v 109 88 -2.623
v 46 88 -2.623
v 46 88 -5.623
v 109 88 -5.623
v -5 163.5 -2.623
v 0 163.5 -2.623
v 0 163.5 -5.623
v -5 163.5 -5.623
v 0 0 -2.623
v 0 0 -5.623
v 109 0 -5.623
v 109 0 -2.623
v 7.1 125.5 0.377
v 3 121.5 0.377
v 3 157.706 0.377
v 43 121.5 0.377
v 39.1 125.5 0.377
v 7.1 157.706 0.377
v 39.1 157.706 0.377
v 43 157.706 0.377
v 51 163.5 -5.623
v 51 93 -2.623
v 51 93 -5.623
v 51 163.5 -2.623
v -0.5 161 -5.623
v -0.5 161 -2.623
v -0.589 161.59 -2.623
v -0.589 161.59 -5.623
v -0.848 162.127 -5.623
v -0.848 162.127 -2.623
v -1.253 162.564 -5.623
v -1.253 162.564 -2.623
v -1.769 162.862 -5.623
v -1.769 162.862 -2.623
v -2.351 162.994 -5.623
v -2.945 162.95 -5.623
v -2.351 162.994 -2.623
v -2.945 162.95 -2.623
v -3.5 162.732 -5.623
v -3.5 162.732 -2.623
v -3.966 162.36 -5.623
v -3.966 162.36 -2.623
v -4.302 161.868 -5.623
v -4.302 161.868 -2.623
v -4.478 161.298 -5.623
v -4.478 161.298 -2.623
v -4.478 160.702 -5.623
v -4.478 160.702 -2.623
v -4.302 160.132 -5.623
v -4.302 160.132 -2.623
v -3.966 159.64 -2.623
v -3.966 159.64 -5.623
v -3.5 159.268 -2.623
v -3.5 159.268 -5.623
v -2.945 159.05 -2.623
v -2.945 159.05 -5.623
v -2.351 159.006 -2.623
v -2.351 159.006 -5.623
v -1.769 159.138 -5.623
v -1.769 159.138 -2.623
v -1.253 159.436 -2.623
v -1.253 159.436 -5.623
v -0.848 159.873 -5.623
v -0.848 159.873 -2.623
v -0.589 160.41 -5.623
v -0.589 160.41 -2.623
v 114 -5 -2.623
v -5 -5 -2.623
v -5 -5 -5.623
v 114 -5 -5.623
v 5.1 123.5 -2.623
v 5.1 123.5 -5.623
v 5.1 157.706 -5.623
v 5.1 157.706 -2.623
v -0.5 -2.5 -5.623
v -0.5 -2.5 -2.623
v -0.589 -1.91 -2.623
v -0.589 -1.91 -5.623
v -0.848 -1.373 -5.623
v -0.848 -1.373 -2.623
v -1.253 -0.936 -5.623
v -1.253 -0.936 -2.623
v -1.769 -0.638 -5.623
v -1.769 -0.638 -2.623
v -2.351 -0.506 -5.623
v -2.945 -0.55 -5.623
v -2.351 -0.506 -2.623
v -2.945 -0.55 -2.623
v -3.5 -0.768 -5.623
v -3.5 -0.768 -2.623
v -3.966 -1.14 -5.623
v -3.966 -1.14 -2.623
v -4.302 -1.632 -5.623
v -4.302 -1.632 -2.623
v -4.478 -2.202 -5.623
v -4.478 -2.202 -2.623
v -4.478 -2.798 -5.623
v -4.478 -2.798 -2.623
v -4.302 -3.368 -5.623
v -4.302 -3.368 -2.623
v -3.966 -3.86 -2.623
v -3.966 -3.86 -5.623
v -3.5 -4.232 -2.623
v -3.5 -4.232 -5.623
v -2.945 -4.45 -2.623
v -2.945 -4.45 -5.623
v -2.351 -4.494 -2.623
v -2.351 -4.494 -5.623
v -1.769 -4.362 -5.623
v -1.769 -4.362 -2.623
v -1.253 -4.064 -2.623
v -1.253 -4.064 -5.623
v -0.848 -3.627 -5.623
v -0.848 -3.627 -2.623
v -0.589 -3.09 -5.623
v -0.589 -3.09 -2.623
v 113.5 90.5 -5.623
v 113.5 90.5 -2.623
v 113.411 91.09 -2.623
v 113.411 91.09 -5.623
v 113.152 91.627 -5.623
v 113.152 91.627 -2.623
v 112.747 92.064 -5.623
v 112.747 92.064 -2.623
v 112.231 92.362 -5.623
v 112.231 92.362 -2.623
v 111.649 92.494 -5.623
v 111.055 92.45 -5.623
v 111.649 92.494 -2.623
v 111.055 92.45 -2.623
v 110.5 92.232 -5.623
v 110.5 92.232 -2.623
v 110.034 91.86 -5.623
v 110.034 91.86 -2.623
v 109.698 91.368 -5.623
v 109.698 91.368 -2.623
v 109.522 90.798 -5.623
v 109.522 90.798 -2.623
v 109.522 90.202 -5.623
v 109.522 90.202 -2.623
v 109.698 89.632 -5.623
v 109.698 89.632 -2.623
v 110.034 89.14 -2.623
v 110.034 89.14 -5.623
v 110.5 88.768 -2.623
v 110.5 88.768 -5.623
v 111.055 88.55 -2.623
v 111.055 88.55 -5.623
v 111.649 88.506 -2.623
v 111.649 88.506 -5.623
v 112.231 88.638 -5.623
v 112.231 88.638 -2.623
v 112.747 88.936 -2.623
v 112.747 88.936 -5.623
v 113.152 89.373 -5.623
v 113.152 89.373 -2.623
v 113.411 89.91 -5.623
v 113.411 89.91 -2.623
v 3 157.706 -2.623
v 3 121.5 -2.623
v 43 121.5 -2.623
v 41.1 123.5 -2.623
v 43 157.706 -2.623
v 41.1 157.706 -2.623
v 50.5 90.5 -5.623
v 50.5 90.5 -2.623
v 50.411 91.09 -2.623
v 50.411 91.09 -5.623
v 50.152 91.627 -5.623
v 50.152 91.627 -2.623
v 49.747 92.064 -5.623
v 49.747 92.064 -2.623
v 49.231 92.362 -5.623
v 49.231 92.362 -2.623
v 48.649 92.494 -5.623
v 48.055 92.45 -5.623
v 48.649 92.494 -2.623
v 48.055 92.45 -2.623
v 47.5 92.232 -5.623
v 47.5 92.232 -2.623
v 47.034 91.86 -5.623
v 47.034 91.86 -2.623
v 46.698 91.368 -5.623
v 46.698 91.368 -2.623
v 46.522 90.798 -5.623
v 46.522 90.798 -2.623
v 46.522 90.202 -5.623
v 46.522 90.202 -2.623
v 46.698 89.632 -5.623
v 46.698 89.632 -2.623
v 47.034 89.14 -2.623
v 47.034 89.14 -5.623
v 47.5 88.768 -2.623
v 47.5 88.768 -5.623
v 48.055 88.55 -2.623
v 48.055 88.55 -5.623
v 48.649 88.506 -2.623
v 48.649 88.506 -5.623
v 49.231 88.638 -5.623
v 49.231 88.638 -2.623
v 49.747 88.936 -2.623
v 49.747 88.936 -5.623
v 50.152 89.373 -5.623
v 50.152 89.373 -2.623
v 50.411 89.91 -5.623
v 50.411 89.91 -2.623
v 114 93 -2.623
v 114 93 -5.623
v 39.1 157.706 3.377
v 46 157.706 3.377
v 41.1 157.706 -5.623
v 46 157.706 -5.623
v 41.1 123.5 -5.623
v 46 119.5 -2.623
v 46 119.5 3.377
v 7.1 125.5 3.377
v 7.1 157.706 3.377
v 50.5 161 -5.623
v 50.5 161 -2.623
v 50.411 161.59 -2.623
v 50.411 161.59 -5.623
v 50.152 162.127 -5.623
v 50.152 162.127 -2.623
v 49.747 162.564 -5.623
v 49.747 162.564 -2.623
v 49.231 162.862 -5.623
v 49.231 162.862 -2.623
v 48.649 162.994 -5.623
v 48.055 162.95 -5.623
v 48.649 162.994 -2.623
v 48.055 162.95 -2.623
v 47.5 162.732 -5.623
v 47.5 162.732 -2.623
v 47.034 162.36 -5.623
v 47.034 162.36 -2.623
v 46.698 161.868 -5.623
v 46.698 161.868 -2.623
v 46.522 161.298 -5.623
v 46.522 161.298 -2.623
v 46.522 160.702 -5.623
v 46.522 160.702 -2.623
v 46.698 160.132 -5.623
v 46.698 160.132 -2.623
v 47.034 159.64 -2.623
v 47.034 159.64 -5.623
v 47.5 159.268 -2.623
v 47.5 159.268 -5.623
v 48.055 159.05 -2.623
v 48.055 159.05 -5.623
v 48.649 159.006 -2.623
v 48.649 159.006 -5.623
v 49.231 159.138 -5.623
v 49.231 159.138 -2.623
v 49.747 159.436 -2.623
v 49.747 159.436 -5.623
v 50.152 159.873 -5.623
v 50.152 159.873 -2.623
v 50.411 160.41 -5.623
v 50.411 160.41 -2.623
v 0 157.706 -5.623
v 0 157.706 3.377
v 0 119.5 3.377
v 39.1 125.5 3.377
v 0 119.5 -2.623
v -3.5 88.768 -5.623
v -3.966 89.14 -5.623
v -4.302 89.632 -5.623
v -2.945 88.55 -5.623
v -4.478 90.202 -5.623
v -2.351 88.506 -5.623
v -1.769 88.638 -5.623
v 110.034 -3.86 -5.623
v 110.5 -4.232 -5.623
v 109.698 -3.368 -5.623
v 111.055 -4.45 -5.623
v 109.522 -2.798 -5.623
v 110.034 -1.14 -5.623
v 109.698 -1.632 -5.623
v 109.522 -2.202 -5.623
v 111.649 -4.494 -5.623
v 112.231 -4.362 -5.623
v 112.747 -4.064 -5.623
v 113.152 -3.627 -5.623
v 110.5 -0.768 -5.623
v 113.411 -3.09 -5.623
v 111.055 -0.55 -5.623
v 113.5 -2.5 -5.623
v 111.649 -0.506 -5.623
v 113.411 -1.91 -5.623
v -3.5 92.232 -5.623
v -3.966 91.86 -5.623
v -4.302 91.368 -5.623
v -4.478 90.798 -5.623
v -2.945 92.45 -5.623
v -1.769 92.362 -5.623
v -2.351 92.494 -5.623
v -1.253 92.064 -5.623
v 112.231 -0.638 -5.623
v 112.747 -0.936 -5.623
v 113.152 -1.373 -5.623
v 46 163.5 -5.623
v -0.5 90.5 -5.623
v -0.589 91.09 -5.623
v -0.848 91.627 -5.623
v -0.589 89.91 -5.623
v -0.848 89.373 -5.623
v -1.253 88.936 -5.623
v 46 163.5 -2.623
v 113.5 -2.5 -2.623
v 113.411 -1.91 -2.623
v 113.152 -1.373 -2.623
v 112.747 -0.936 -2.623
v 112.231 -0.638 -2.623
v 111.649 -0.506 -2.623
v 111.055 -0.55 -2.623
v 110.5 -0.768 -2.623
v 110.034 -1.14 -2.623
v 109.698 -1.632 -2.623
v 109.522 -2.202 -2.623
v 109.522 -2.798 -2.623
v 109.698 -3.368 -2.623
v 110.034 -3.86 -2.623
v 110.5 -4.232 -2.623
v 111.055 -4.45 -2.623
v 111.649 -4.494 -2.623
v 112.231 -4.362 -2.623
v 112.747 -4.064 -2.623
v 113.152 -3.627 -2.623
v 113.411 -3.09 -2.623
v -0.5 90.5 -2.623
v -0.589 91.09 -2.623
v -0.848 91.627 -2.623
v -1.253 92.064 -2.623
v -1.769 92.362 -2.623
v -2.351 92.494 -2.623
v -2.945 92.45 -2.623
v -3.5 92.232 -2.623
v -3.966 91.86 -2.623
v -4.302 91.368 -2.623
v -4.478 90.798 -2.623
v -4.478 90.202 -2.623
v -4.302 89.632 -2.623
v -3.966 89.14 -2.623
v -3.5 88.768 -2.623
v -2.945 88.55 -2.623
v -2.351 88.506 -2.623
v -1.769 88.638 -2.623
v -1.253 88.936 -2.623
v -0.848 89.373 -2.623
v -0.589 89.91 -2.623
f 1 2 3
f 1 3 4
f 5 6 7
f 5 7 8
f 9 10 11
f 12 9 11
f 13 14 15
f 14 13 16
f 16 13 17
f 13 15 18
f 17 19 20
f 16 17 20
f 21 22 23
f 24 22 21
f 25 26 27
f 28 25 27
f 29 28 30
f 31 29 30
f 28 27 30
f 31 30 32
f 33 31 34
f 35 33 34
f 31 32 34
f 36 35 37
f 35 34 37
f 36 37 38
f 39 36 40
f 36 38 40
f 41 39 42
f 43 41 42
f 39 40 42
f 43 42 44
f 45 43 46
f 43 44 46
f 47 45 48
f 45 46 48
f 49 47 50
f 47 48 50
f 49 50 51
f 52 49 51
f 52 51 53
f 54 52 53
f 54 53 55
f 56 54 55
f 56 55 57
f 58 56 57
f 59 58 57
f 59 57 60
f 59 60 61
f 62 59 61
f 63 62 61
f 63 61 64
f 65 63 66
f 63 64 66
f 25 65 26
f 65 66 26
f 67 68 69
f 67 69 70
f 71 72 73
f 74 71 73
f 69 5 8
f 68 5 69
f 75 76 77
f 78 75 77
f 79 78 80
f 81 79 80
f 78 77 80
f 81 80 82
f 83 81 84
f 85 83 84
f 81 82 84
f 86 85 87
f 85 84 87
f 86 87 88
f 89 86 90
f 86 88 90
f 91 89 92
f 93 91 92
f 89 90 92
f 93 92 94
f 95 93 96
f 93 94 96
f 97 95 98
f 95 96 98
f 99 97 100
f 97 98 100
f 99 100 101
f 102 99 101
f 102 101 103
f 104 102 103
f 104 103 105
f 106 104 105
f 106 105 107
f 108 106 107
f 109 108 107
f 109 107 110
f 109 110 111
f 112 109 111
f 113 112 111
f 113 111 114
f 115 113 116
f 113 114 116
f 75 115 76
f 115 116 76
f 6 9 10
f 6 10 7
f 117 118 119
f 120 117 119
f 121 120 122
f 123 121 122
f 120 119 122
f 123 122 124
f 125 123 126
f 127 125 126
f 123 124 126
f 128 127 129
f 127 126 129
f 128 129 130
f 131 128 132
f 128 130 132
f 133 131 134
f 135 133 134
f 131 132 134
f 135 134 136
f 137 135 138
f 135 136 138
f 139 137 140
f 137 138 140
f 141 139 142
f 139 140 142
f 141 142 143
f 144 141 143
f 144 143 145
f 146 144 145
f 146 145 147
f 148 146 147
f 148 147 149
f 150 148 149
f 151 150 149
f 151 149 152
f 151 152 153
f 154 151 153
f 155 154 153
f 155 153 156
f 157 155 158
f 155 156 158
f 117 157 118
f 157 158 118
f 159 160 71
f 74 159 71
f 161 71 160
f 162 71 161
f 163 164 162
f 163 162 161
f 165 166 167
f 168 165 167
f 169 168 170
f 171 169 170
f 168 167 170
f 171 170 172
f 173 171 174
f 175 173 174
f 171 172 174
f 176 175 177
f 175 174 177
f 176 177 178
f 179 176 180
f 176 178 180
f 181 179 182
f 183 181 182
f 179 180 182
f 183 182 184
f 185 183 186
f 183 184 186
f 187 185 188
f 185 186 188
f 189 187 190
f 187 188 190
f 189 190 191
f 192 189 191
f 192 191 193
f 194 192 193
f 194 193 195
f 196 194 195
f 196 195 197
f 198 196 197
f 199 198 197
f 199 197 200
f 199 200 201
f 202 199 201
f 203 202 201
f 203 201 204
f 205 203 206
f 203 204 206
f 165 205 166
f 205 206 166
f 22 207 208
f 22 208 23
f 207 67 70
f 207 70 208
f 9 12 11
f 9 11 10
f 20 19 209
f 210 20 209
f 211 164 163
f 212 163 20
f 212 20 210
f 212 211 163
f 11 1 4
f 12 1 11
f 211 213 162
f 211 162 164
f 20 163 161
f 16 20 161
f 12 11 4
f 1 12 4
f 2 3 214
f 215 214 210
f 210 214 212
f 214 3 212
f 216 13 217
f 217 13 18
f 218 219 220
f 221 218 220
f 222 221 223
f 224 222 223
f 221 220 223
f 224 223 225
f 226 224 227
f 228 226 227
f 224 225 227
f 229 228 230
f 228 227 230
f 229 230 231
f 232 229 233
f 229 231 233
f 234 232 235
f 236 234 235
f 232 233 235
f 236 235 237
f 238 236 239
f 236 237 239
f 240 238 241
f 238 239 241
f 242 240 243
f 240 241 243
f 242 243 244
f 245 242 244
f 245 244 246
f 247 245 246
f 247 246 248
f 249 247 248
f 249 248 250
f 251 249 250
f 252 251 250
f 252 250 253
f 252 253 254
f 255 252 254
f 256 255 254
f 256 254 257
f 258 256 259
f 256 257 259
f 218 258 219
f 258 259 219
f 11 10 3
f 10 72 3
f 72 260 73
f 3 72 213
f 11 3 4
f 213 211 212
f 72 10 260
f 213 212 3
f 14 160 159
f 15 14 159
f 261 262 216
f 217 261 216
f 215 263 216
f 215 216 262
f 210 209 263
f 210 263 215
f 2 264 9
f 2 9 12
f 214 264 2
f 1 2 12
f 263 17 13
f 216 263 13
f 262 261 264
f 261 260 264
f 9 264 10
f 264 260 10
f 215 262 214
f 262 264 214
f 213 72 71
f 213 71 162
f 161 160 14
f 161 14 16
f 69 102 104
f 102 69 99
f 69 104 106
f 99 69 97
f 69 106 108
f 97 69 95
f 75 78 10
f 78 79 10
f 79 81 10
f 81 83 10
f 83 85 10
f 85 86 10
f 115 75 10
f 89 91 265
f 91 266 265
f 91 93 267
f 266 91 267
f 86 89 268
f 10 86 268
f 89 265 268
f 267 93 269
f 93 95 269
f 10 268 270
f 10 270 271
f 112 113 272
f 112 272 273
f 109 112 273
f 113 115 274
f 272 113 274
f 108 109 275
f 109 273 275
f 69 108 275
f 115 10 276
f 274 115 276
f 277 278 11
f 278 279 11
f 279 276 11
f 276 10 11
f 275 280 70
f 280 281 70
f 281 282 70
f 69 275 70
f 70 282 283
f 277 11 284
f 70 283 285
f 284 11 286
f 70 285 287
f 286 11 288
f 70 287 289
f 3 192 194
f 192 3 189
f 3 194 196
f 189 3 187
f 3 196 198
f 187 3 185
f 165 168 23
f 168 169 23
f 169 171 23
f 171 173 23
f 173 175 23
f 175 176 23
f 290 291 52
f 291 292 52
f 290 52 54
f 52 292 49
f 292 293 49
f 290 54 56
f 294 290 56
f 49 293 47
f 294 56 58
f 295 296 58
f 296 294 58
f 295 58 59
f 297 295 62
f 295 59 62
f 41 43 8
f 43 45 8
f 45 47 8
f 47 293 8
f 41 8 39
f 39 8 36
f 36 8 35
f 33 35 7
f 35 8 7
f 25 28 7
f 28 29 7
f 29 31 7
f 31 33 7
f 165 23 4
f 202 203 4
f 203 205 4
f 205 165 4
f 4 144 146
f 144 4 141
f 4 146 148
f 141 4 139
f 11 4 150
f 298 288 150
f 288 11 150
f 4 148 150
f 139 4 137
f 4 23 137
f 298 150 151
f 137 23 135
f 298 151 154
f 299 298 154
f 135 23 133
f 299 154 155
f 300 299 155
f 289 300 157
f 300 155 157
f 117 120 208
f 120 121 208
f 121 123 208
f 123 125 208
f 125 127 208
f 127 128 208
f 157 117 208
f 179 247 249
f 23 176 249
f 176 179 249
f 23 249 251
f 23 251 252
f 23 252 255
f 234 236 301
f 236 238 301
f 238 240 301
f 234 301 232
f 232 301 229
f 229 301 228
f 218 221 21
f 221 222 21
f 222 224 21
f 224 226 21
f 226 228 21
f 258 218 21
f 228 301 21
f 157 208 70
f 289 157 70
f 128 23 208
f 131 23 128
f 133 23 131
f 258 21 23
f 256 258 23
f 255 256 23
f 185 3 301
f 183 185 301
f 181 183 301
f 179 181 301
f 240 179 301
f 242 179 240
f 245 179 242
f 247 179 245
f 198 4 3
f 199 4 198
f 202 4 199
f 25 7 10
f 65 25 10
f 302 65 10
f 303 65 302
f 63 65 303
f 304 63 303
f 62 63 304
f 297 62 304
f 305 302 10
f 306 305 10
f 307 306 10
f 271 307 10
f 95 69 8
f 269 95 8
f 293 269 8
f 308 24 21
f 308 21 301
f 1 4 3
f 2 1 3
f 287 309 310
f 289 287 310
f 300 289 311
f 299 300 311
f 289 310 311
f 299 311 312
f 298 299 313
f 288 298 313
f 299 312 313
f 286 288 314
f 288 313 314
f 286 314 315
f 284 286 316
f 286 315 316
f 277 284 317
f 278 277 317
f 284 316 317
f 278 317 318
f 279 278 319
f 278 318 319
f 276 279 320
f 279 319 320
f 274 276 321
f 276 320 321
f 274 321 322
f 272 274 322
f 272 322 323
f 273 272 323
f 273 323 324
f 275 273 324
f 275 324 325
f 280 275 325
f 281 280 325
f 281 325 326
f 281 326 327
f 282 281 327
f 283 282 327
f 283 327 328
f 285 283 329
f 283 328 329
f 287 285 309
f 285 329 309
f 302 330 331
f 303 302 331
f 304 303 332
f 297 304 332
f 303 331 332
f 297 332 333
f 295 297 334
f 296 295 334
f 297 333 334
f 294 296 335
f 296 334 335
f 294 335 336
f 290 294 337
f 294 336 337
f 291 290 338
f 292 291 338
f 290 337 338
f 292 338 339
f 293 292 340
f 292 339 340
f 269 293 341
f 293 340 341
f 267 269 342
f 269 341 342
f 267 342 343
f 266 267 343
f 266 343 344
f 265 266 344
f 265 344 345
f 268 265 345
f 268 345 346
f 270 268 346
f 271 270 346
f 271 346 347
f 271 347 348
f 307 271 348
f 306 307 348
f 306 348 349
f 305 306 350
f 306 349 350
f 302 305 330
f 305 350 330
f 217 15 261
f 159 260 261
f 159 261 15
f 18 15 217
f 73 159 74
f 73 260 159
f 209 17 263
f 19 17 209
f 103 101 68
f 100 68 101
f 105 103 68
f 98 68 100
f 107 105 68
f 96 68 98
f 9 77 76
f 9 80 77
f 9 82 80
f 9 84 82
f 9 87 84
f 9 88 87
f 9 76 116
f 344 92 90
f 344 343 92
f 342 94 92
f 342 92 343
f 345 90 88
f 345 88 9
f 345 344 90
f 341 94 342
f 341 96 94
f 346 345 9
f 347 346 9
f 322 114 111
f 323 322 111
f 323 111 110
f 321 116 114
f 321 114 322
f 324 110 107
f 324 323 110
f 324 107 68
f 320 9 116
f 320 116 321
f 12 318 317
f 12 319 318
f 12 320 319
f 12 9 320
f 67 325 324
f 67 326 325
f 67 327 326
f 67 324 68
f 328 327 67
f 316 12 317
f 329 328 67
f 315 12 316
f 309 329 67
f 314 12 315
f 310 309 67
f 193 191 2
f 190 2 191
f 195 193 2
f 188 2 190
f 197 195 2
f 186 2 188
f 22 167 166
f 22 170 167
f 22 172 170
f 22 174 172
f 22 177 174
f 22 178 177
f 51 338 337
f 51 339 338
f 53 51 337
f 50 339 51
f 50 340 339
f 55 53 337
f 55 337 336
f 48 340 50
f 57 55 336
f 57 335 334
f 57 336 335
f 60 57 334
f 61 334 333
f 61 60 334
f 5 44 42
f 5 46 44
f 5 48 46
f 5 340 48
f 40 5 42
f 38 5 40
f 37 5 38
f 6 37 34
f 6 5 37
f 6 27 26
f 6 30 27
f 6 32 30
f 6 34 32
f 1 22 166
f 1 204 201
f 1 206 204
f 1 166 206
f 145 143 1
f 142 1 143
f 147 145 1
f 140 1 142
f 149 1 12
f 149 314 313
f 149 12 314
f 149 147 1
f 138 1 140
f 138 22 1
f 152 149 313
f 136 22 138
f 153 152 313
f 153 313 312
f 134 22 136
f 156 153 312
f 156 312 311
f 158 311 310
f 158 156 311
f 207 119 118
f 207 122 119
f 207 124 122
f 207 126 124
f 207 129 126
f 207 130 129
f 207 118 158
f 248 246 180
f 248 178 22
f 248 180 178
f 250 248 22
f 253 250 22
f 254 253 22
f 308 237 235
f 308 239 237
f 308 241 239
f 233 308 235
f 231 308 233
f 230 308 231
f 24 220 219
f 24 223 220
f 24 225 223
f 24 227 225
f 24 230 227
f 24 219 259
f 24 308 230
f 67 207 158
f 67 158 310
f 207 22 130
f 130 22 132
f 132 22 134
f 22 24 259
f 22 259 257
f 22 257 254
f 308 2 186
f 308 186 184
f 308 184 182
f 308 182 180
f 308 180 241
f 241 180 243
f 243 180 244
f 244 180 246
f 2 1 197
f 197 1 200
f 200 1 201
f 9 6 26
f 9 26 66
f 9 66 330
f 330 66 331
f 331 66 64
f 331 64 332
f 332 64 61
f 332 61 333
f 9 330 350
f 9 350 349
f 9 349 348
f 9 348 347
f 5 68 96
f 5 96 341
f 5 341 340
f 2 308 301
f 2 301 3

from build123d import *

# Parameters (mm, degrees)
P_IDAT_VYSUNUT_M1_DEPTH       = 3
ODEBRAT_VYSUNUT_M1_DEPTH      = 192.731897986
ODEBRAT_VYSUNUT_M1_DEPTH_BACK = 192.731897986
SKICA2_W                      = 36
SKICA2_H                      = 36
P_IDAT_VYSUNUT_M2_DEPTH       = 3
P_IDAT_VYSUNUT_M3_DEPTH       = 3
P_IDAT_VYSUNUT_M5_DEPTH       = 3
SKICA6_R                      = 2
ODEBRAT_VYSUNUT_M2_DEPTH      = 3


with BuildPart() as part:
    # Skica1 → Přidat vysunutím1 (new body)
    with BuildSketch(Plane.XY.offset(-5.622795176)):
        Polygon((0, 0), (46, 0), (109, 0), (109, 88), (46, 88), (46, 157.705804286), (0, 157.705804286), align=None)
    extrude(amount=P_IDAT_VYSUNUT_M1_DEPTH)

    # Skica2 → Odebrat vysunutím1 (cut, two sides: drawn at the far end of the back side and taken through both)
    with BuildSketch(Plane.XY.offset(-2.622795176).offset(-ODEBRAT_VYSUNUT_M1_DEPTH_BACK)):
        with Locations((23.1, 141.5)):
            Rectangle(SKICA2_W, SKICA2_H)
    extrude(amount=ODEBRAT_VYSUNUT_M1_DEPTH + ODEBRAT_VYSUNUT_M1_DEPTH_BACK, mode=Mode.SUBTRACT)

    # Skica3 → Přidat vysunutím2 (add)
    with BuildSketch(Plane.XY.offset(-2.622795176)):
        Polygon((46, 157.705804286), (46, 119.5), (0, 119.5), (0, 157.705804286), (3, 157.705804286), (3, 123.5), (3, 121.5), (43, 121.5), (43, 123.5), (43, 157.705804286), align=None)
    extrude(amount=P_IDAT_VYSUNUT_M2_DEPTH)

    # Skica4 → Přidat vysunutím3 (add)
    with BuildSketch(Plane.XY.offset(0.377204824)):
        Polygon((46, 157.705804286), (39.1, 157.705804286), (39.1, 125.5), (7.1, 125.5), (7.1, 157.705804286), (0, 157.705804286), (0, 119.5), (46, 119.5), align=None)
    extrude(amount=P_IDAT_VYSUNUT_M3_DEPTH)


with BuildPart() as body_2:
    # Skica5 → Přidat vysunutím5 (new body)
    with BuildSketch(Plane.XY.offset(-2.622795176)):
        Polygon((0, 163.5), (-5, 163.5), (-5, -5), (114, -5), (114, 93), (51, 93), (51, 163.5), (46, 163.5), (46, 88), (109, 88), (109, 0), (0, 0), align=None)
    extrude(amount=-P_IDAT_VYSUNUT_M5_DEPTH)

    # Skica6 → Odebrat vysunutím2 (cut)
    with BuildSketch(Plane.XY.offset(-2.622795176)):
        with Locations((-2.5, -2.5)):
            Circle(SKICA6_R)
        with Locations((111.5, -2.5)):
            Circle(SKICA6_R)
        with Locations((111.5, 90.5)):
            Circle(SKICA6_R)
        with Locations((48.5, 90.5)):
            Circle(SKICA6_R)
        with Locations((48.5, 161)):
            Circle(SKICA6_R)
        with Locations((-2.5, 161)):
            Circle(SKICA6_R)
        with Locations((-2.5, 90.5)):
            Circle(SKICA6_R)
    extrude(amount=-ODEBRAT_VYSUNUT_M2_DEPTH, mode=Mode.SUBTRACT)


solid = Compound([part.part, body_2.part])
